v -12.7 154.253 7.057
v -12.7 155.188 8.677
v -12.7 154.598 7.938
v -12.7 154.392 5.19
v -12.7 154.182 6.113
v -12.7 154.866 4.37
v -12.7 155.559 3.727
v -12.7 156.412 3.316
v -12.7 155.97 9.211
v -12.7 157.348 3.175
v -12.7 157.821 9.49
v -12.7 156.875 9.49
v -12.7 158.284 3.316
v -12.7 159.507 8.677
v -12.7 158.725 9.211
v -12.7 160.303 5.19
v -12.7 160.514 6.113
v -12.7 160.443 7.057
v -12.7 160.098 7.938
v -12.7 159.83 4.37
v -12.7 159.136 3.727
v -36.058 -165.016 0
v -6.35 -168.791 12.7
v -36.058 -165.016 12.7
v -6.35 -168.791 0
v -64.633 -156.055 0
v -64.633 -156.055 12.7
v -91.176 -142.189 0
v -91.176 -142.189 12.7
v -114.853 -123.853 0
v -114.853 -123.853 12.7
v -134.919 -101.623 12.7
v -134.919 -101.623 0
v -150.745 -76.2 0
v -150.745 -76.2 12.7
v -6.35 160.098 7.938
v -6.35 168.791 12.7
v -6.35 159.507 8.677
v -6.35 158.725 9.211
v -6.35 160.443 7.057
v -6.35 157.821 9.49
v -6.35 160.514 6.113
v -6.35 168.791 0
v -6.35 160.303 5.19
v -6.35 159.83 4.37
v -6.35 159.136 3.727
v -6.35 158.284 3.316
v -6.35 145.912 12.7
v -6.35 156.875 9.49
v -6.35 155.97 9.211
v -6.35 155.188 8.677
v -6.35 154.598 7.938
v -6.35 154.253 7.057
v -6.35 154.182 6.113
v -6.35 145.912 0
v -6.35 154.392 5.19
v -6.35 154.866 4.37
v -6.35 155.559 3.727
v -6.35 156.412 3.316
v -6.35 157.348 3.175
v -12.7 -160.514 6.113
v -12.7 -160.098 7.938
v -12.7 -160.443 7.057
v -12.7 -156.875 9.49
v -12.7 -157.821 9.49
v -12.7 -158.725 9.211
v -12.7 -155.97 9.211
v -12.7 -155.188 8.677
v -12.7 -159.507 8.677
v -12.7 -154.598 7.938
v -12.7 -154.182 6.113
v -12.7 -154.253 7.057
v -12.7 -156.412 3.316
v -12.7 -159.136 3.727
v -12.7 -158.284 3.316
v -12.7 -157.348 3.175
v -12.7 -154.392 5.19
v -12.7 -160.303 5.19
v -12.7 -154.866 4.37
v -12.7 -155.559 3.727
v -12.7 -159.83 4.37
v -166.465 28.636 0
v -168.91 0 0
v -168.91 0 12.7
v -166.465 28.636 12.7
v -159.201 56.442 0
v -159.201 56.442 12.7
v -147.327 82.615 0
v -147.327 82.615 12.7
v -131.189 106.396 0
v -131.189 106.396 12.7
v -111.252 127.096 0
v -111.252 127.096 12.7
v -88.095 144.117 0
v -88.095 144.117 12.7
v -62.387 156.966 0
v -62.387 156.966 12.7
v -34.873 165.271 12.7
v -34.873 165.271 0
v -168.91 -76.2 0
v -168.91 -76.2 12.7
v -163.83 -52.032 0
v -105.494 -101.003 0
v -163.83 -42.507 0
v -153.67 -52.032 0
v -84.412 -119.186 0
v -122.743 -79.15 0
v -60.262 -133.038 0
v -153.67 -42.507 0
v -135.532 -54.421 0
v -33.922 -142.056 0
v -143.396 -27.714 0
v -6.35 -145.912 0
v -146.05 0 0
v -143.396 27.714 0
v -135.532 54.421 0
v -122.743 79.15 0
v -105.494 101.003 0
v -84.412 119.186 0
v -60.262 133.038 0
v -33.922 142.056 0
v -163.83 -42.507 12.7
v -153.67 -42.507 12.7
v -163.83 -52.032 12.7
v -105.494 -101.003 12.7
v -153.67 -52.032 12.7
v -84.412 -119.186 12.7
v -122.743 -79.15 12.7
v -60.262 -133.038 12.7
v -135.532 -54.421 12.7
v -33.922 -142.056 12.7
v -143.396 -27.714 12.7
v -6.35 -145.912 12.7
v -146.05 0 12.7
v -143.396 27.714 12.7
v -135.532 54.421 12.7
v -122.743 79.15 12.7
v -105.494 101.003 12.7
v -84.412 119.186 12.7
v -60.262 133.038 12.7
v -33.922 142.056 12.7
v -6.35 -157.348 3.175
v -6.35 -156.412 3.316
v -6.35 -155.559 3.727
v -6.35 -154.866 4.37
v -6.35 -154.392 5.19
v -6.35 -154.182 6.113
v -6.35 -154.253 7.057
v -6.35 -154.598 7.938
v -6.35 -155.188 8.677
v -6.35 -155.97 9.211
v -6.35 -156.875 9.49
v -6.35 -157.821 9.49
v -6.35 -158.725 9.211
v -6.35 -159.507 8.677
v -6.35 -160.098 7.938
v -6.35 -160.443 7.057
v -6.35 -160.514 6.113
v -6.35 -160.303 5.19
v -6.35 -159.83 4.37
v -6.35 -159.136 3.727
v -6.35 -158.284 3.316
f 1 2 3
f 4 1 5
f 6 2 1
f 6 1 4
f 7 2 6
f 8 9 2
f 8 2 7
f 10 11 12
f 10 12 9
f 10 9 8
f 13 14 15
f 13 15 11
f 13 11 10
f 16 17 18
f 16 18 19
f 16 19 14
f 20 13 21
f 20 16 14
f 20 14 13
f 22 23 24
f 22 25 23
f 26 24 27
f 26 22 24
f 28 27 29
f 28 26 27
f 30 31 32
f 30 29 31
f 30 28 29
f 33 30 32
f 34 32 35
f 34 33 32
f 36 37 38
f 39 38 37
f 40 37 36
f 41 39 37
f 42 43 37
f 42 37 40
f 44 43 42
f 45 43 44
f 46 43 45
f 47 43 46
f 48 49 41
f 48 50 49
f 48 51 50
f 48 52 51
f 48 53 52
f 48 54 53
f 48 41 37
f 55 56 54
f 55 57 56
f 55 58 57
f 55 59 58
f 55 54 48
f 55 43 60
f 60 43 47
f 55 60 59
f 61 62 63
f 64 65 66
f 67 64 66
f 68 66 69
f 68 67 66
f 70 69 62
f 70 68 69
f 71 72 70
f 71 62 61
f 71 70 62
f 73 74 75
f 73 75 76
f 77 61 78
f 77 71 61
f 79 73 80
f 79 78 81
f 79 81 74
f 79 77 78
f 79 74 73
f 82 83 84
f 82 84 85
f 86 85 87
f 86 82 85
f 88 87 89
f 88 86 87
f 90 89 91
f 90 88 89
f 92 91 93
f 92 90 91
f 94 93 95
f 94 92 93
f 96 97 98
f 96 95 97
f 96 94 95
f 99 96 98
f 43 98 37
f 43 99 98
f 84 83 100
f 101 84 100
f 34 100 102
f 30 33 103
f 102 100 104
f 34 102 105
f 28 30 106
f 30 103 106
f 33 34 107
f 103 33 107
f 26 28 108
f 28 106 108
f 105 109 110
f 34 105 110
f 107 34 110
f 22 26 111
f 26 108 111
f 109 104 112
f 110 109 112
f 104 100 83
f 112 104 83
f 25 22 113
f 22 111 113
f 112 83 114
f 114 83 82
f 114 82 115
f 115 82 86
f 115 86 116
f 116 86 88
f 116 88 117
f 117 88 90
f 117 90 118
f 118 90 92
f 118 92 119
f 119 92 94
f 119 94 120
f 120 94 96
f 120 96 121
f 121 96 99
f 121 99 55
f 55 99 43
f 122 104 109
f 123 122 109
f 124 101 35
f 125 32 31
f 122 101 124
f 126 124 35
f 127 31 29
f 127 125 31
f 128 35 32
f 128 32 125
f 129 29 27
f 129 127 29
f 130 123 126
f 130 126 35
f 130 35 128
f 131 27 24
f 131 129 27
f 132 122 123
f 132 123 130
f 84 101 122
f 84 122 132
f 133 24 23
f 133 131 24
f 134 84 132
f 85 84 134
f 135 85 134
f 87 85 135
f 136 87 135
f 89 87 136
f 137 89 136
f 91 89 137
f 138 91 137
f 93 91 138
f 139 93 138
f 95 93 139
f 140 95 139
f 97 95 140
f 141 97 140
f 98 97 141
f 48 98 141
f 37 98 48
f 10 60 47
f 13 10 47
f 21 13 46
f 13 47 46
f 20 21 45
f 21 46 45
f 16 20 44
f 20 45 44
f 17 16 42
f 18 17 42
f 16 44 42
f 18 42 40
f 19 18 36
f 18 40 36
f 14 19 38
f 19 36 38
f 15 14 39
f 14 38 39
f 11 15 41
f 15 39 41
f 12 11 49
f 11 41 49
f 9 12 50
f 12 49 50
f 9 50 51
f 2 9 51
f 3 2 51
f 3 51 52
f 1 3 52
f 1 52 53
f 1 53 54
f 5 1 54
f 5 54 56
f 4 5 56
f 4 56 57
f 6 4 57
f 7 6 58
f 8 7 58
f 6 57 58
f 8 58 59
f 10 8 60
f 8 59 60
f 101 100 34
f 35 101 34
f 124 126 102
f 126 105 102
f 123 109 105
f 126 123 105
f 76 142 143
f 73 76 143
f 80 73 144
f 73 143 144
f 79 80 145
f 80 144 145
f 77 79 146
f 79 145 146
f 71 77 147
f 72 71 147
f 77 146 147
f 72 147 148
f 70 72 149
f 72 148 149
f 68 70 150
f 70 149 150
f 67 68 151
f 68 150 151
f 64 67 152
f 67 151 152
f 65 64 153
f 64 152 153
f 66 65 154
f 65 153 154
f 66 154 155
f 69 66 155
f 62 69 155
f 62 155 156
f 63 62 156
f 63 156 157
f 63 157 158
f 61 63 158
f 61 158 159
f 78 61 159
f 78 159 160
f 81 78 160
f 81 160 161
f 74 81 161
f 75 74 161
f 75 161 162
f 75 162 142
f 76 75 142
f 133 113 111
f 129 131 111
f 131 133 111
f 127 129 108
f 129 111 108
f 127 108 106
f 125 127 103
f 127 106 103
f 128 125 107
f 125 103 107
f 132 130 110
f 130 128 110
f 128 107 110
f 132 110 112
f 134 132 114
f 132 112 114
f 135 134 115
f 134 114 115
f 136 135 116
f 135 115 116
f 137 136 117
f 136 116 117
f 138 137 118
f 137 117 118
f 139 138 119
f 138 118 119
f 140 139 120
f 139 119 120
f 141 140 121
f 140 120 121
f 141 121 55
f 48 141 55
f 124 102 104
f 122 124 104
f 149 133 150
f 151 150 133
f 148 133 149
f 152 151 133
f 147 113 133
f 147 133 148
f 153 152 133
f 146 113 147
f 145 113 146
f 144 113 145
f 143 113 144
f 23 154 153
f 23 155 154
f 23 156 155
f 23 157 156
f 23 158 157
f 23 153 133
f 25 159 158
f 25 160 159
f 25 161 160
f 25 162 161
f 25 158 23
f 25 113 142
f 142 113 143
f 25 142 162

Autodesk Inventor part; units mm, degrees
ref_plane "YZ Plane" through (0, 0, 0) normal (1, 0, 0) x (0, 1, 0)
ref_plane "XZ Plane" through (0, 0, 0) normal (0, 1, 0) x (-1, 0, 0)
ref_plane "XY Plane" through (0, 0, 0) normal (0, 0, 1) x (1, 0, 0)
sketch "Sketch1" plane through (0, 0, 0) normal (0, 0, 1) x (1, 0, 0)
  arc A0 (-6.35, 145.9119) -> (0, -146.05) centre (0, 0) ccw
  line L0 (-168.91, 0) -> (168.91, 0) construction
  line L1 (0, -146.05) -> (0, -168.91) construction
  line L2 (-168.91, 0) -> (-168.91, -76.2)
  line L3 (-168.91, -76.2) -> (-150.7453, -76.2)
  line L4 (0, 0) -> (0, -47.2694) construction
  line L5 (0, -47.2694) -> (-158.75, -47.2694) construction
  line L6 (-158.75, -42.5069) -> (-153.67, -42.5069)
  line L7 (-153.67, -42.5069) -> (-153.67, -52.0319)
  line L8 (-153.67, -52.0319) -> (-163.83, -52.0319)
  line L9 (-163.83, -52.0319) -> (-163.83, -42.5069)
  line L10 (-163.83, -42.5069) -> (-158.75, -42.5069)
  arc A1 (-150.7453, -76.2) -> (-6.35, -168.7906) centre (0, 0) ccw
  arc A2 (-6.35, 168.7906) -> (-168.91, 0) centre (0, 0) ccw
  line L11 (-6.35, -145.9119) -> (-6.35, -151.13)
  line L12 (-6.35, -161.29) -> (-6.35, -168.7906)
  line L13 (-6.35, -145.9119) -> (-6.35, -151.13)
  line L14 (-6.35, -161.29) -> (-6.35, -168.7906)
  line L15 (-6.35, 168.7906) -> (-6.35, 161.29)
  line L16 (-6.35, 151.13) -> (-6.35, 145.9119)
  line L17 (-6.35, -168.7906) -> (-6.35, -161.29)
  line L18 (-6.35, -151.13) -> (-6.35, -145.9119)
  line L19 (-6.35, 161.29) -> (-6.35, 151.13)
  line L20 (-6.35, -151.13) -> (-6.35, -161.29)
  point P0 (0, 161.29)
  point P1 (0, -151.13)
  point P2 (0, -161.29)
  dimension "d0" = 292.1
  dimension "d8" = 76.2
  dimension "d9" = 47.2694
  dimension "d10" = 158.75
  dimension "d12" = 4.7625
  dimension "d13" = 5.08
  dimension "d14" = 9.525
  dimension "d15" = 10.16
  dimension "d17" = 5.08
  dimension "d22" = 22.8787
  dimension "d23" = 24.1681
  dimension "d26" = 168.91
extrude "Extrusion1" add sketch "Sketch1" along normal blind 12.7
sketch "Sketch2" plane through (-6.35, 145.9119, 0) normal (1, 0, 0) x (0, 0, -1)
  line L0 (0, 0) -> (0, 22.8787) projected
  line L1 (0, 22.8787) -> (-12.7, 22.8787) projected
  line L2 (0, 0) -> (-12.7, 0) projected
  circle A0 centre (-6.35, 11.436) radius 3.175
  line L3 (0, -145.9119) -> (96.3473, -145.9119) construction
  line L4 (96.3473, -145.9119) -> (-165.7611, -145.9119) construction
  circle A1 centre (-6.35, -303.2598) radius 3.175
  dimension "d27" = 6.35
  dimension "d28" = 11.4427
  dimension "d29" = 6.35
extrude "Extrusion2" cut sketch "Sketch2" against normal blind 6.35
properties part number "TopfemaleHoopSection_v3"
